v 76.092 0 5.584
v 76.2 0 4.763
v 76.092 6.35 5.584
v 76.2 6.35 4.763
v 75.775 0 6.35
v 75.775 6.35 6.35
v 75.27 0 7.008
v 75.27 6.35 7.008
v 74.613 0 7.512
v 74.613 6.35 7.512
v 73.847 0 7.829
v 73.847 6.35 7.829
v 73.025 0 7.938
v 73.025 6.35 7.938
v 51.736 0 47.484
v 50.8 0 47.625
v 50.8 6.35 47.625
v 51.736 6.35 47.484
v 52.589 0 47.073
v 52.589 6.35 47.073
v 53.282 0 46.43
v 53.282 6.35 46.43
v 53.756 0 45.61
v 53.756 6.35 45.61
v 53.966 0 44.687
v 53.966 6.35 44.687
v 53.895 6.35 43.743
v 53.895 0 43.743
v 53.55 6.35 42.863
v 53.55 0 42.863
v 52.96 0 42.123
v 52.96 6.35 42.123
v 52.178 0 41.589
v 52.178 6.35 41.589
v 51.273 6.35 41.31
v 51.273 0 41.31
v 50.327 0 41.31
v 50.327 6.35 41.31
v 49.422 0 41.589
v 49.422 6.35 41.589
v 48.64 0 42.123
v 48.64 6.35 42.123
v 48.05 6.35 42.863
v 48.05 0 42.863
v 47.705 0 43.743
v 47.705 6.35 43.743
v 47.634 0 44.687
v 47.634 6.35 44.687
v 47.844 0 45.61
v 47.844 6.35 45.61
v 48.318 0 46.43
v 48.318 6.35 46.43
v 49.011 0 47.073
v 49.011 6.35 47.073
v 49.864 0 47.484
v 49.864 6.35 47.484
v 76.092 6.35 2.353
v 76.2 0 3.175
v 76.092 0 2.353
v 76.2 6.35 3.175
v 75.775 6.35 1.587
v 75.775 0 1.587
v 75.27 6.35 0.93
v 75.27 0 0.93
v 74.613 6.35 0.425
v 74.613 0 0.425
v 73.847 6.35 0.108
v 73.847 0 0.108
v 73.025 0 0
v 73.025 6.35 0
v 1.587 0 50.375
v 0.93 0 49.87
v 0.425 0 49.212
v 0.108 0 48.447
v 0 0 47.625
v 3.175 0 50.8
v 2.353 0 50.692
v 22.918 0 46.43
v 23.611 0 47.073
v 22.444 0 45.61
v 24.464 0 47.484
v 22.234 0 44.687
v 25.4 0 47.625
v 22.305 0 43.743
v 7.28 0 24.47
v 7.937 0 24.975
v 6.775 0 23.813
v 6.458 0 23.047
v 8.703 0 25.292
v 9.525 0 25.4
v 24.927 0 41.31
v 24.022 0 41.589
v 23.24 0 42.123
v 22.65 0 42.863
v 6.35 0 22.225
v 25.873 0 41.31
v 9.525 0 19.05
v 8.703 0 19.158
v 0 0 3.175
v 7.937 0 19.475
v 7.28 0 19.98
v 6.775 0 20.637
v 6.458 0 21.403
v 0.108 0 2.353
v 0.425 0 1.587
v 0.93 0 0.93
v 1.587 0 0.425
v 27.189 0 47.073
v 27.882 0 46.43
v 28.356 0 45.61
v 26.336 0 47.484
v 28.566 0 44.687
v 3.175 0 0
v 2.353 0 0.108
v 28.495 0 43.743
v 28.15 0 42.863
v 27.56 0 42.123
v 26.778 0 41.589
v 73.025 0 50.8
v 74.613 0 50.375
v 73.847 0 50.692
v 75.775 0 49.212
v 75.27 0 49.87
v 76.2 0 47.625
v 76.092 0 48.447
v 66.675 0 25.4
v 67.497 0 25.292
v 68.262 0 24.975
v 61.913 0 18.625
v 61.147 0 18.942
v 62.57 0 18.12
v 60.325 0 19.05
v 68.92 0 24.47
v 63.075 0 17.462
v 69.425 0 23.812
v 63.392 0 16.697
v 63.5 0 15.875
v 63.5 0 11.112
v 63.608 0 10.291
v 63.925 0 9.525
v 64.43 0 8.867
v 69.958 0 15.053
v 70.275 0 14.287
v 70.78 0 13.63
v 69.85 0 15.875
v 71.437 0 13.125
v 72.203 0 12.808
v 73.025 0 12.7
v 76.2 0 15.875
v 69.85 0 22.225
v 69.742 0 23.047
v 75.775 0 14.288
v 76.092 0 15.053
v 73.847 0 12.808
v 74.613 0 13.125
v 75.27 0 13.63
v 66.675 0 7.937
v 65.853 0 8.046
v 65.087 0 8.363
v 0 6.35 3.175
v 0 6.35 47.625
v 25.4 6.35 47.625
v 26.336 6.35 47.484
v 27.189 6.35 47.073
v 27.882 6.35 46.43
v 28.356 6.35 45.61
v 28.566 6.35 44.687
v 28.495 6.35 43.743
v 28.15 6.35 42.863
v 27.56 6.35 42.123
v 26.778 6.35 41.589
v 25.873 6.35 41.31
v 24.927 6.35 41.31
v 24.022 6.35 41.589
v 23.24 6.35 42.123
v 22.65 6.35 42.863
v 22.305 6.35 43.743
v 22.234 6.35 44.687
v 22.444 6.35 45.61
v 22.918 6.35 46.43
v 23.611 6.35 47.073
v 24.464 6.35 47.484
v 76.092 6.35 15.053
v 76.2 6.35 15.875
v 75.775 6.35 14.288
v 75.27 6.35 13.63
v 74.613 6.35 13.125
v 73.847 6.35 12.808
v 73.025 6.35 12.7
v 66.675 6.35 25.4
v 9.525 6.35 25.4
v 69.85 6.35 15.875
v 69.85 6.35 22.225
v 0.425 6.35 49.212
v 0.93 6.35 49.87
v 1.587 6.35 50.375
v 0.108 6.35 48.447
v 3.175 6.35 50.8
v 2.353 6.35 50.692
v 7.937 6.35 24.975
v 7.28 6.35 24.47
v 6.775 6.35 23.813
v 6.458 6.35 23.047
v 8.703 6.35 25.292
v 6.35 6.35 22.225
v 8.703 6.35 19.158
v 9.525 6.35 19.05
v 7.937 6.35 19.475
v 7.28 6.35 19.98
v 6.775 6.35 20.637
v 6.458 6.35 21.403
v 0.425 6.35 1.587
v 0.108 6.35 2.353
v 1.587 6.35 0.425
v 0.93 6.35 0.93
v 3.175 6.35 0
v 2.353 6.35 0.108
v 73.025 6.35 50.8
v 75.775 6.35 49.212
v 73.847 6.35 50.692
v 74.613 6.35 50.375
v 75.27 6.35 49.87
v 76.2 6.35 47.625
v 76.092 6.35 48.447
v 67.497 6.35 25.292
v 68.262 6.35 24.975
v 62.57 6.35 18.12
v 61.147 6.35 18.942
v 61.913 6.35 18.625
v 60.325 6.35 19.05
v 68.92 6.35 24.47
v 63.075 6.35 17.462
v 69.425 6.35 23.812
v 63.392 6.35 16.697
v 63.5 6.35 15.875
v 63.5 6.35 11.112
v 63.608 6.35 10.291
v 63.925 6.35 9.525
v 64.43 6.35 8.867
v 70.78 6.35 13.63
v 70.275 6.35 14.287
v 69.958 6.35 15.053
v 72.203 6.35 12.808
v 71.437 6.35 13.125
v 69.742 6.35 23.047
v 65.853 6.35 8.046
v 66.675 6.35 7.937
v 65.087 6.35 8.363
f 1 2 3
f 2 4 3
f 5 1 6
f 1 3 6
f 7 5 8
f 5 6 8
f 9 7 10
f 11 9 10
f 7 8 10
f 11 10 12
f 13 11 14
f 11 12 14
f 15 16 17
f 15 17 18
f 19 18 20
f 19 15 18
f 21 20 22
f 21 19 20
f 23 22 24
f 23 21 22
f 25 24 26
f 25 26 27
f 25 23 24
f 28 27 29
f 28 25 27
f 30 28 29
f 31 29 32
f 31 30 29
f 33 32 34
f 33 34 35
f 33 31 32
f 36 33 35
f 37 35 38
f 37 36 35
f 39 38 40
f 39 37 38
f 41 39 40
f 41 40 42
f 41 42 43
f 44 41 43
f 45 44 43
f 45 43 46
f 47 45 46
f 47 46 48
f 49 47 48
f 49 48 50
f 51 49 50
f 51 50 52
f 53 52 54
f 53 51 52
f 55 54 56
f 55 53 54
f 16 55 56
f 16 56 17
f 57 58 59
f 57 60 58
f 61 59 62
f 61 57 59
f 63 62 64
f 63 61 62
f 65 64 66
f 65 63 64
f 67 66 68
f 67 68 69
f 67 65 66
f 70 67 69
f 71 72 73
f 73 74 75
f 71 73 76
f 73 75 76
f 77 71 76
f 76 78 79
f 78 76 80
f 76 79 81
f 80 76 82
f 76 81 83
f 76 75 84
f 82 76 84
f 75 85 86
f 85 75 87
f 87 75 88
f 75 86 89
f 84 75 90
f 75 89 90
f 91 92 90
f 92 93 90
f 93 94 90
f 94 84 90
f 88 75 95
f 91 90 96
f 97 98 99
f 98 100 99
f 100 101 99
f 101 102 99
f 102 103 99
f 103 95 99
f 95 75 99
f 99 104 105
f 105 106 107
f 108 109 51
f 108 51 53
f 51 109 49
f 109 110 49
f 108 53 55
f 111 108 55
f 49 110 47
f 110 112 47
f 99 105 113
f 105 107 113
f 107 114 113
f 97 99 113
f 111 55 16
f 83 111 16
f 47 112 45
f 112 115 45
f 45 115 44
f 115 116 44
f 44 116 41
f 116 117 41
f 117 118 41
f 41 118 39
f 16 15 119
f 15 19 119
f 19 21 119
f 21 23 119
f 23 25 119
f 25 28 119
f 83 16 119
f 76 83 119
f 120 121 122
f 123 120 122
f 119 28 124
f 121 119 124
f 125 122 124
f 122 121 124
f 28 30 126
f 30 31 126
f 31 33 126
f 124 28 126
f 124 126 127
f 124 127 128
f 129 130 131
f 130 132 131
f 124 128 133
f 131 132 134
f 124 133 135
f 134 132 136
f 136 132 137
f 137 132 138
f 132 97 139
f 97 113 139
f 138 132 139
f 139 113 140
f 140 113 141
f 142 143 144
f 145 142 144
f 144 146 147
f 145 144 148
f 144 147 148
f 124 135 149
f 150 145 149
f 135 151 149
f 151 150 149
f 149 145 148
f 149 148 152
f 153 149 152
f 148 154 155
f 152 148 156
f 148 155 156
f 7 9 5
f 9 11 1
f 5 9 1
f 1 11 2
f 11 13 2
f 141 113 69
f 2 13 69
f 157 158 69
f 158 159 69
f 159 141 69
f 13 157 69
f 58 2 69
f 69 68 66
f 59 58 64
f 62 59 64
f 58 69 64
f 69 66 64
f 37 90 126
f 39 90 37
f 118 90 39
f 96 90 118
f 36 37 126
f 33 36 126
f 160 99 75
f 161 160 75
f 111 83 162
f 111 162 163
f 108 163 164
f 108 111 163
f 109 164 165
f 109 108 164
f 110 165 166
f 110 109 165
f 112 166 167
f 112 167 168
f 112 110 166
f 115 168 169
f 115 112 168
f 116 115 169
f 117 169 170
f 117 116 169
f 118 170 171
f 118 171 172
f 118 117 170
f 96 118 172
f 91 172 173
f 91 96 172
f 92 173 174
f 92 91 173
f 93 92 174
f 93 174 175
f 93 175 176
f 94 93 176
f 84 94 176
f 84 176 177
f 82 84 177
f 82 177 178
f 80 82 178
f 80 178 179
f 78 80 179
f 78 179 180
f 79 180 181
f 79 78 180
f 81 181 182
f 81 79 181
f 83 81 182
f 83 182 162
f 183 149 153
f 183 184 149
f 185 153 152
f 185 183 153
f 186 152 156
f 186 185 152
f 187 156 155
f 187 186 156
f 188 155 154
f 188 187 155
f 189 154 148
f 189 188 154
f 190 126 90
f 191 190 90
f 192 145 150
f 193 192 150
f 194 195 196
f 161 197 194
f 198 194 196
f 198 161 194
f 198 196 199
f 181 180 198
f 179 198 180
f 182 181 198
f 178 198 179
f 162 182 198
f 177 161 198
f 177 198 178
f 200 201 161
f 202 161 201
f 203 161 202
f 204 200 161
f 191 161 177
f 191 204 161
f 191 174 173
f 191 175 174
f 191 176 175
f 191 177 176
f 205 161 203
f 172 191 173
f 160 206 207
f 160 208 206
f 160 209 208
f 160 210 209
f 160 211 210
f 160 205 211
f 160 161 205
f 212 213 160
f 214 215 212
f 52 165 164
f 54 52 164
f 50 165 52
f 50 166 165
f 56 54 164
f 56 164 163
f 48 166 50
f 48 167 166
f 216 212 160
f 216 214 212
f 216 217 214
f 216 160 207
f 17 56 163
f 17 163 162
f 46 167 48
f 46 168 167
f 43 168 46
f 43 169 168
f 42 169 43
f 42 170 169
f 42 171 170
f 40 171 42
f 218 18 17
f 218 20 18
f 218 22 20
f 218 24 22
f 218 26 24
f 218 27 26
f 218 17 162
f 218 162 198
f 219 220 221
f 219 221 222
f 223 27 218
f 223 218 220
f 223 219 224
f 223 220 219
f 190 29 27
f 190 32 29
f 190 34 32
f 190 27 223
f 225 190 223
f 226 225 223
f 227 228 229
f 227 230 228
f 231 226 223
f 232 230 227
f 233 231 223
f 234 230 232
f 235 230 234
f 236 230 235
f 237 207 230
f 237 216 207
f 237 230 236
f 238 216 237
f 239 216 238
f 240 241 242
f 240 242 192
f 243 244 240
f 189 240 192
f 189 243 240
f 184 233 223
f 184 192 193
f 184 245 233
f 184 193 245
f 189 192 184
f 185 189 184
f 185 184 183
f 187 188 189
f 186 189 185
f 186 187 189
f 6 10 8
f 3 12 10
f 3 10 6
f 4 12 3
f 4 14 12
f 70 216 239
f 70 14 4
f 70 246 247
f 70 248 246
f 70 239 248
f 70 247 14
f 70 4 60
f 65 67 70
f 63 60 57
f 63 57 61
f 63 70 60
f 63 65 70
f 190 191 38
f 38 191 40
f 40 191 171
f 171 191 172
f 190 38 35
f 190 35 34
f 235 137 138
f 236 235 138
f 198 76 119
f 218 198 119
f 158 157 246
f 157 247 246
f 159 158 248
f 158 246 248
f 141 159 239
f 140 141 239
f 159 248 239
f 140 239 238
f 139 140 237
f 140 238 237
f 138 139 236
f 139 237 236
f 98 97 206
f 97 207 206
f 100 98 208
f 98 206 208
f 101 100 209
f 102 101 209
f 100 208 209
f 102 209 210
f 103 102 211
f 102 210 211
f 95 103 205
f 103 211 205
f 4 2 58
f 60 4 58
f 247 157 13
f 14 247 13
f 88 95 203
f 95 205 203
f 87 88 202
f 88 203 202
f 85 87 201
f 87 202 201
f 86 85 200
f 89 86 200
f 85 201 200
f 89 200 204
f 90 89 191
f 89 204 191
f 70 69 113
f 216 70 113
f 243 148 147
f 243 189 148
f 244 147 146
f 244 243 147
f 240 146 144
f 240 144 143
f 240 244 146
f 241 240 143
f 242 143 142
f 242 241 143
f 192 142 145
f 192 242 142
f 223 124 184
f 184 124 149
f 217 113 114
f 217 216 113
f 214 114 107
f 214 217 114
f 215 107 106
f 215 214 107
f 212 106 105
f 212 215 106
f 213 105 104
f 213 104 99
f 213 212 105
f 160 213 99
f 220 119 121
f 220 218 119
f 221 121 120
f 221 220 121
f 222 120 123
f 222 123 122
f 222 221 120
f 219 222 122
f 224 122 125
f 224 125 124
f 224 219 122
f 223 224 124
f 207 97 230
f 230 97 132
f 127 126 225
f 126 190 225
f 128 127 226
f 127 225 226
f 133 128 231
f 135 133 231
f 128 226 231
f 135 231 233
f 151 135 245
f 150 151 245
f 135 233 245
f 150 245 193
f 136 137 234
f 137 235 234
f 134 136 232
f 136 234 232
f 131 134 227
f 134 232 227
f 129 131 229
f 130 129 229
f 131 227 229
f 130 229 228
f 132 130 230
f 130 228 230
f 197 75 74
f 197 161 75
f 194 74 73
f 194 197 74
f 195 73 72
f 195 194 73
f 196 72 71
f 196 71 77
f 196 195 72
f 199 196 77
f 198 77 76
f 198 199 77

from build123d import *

# Parameters (mm, degrees)
SKETCH1_R           = 3.175
BOSS_EXTRUDE1_DEPTH = 6.35
FILLET1_R           = 3.175
FILLET2_R           = 3.175
FILLET3_R           = 3.175
FILLET4_R           = 3.175


with BuildPart() as part:
    # Sketch1 → Boss-Extrude1 (new body)
    with BuildSketch(Plane(origin=(0, 0, 0), x_dir=(1, 0, 0), z_dir=(0, 1, 0))):
        Polygon((63.5, -7.9375), (76.2, -7.9375), (76.2, 0), (0, 0), (0, -50.8), (76.2, -50.8), (76.2, -12.7), (69.85, -12.7), (69.85, -25.4), (6.35, -25.4), (6.35, -19.05), (63.5, -19.05), align=None)
        with Locations(Location((25.4, -44.45, 0), (0, 0, 270))):
            Circle(SKETCH1_R, mode=Mode.SUBTRACT)
        with Locations(Location((50.8, -44.45, 0), (0, 0, 270))):
            Circle(SKETCH1_R, mode=Mode.SUBTRACT)
    extrude(amount=BOSS_EXTRUDE1_DEPTH)

    # Fillet1
    fillet1_edges = [part.edges().sort_by_distance(p)[0] for p in [
        (6.35, 3.175, 19.05),
        (6.35, 3.175, 25.4),
    ]]
    fillet(fillet1_edges, radius=FILLET1_R - 0.0001)  # a hair under: the kernel refuses the full size

    # Fillet2
    fillet2_edges = [part.edges().sort_by_distance(p)[0] for p in [
        (76.2, 3.175, 50.8),
        (0, 3.175, 50.8),
        (0, 3.175, 0),
        (76.2, 3.175, 0),
    ]]
    fillet(fillet2_edges, radius=FILLET2_R)

    # Fillet3
    fillet3_edges = [part.edges().sort_by_distance(p)[0] for p in [
        (76.2, 3.175, 12.7),
        (76.2, 3.175, 7.9375),
        (63.5, 3.175, 7.9375),
        (63.5, 3.175, 19.05),
        (69.85, 3.175, 25.4),
    ]]
    fillet(fillet3_edges, radius=FILLET3_R)

    # Fillet4
    fillet4_edges = [part.edges().sort_by_distance(p)[0] for p in [
        (69.85, 3.175, 12.7),
    ]]
    fillet(fillet4_edges, radius=FILLET4_R - 0.0001)  # a hair under: the kernel refuses the full size


solid = part.part
